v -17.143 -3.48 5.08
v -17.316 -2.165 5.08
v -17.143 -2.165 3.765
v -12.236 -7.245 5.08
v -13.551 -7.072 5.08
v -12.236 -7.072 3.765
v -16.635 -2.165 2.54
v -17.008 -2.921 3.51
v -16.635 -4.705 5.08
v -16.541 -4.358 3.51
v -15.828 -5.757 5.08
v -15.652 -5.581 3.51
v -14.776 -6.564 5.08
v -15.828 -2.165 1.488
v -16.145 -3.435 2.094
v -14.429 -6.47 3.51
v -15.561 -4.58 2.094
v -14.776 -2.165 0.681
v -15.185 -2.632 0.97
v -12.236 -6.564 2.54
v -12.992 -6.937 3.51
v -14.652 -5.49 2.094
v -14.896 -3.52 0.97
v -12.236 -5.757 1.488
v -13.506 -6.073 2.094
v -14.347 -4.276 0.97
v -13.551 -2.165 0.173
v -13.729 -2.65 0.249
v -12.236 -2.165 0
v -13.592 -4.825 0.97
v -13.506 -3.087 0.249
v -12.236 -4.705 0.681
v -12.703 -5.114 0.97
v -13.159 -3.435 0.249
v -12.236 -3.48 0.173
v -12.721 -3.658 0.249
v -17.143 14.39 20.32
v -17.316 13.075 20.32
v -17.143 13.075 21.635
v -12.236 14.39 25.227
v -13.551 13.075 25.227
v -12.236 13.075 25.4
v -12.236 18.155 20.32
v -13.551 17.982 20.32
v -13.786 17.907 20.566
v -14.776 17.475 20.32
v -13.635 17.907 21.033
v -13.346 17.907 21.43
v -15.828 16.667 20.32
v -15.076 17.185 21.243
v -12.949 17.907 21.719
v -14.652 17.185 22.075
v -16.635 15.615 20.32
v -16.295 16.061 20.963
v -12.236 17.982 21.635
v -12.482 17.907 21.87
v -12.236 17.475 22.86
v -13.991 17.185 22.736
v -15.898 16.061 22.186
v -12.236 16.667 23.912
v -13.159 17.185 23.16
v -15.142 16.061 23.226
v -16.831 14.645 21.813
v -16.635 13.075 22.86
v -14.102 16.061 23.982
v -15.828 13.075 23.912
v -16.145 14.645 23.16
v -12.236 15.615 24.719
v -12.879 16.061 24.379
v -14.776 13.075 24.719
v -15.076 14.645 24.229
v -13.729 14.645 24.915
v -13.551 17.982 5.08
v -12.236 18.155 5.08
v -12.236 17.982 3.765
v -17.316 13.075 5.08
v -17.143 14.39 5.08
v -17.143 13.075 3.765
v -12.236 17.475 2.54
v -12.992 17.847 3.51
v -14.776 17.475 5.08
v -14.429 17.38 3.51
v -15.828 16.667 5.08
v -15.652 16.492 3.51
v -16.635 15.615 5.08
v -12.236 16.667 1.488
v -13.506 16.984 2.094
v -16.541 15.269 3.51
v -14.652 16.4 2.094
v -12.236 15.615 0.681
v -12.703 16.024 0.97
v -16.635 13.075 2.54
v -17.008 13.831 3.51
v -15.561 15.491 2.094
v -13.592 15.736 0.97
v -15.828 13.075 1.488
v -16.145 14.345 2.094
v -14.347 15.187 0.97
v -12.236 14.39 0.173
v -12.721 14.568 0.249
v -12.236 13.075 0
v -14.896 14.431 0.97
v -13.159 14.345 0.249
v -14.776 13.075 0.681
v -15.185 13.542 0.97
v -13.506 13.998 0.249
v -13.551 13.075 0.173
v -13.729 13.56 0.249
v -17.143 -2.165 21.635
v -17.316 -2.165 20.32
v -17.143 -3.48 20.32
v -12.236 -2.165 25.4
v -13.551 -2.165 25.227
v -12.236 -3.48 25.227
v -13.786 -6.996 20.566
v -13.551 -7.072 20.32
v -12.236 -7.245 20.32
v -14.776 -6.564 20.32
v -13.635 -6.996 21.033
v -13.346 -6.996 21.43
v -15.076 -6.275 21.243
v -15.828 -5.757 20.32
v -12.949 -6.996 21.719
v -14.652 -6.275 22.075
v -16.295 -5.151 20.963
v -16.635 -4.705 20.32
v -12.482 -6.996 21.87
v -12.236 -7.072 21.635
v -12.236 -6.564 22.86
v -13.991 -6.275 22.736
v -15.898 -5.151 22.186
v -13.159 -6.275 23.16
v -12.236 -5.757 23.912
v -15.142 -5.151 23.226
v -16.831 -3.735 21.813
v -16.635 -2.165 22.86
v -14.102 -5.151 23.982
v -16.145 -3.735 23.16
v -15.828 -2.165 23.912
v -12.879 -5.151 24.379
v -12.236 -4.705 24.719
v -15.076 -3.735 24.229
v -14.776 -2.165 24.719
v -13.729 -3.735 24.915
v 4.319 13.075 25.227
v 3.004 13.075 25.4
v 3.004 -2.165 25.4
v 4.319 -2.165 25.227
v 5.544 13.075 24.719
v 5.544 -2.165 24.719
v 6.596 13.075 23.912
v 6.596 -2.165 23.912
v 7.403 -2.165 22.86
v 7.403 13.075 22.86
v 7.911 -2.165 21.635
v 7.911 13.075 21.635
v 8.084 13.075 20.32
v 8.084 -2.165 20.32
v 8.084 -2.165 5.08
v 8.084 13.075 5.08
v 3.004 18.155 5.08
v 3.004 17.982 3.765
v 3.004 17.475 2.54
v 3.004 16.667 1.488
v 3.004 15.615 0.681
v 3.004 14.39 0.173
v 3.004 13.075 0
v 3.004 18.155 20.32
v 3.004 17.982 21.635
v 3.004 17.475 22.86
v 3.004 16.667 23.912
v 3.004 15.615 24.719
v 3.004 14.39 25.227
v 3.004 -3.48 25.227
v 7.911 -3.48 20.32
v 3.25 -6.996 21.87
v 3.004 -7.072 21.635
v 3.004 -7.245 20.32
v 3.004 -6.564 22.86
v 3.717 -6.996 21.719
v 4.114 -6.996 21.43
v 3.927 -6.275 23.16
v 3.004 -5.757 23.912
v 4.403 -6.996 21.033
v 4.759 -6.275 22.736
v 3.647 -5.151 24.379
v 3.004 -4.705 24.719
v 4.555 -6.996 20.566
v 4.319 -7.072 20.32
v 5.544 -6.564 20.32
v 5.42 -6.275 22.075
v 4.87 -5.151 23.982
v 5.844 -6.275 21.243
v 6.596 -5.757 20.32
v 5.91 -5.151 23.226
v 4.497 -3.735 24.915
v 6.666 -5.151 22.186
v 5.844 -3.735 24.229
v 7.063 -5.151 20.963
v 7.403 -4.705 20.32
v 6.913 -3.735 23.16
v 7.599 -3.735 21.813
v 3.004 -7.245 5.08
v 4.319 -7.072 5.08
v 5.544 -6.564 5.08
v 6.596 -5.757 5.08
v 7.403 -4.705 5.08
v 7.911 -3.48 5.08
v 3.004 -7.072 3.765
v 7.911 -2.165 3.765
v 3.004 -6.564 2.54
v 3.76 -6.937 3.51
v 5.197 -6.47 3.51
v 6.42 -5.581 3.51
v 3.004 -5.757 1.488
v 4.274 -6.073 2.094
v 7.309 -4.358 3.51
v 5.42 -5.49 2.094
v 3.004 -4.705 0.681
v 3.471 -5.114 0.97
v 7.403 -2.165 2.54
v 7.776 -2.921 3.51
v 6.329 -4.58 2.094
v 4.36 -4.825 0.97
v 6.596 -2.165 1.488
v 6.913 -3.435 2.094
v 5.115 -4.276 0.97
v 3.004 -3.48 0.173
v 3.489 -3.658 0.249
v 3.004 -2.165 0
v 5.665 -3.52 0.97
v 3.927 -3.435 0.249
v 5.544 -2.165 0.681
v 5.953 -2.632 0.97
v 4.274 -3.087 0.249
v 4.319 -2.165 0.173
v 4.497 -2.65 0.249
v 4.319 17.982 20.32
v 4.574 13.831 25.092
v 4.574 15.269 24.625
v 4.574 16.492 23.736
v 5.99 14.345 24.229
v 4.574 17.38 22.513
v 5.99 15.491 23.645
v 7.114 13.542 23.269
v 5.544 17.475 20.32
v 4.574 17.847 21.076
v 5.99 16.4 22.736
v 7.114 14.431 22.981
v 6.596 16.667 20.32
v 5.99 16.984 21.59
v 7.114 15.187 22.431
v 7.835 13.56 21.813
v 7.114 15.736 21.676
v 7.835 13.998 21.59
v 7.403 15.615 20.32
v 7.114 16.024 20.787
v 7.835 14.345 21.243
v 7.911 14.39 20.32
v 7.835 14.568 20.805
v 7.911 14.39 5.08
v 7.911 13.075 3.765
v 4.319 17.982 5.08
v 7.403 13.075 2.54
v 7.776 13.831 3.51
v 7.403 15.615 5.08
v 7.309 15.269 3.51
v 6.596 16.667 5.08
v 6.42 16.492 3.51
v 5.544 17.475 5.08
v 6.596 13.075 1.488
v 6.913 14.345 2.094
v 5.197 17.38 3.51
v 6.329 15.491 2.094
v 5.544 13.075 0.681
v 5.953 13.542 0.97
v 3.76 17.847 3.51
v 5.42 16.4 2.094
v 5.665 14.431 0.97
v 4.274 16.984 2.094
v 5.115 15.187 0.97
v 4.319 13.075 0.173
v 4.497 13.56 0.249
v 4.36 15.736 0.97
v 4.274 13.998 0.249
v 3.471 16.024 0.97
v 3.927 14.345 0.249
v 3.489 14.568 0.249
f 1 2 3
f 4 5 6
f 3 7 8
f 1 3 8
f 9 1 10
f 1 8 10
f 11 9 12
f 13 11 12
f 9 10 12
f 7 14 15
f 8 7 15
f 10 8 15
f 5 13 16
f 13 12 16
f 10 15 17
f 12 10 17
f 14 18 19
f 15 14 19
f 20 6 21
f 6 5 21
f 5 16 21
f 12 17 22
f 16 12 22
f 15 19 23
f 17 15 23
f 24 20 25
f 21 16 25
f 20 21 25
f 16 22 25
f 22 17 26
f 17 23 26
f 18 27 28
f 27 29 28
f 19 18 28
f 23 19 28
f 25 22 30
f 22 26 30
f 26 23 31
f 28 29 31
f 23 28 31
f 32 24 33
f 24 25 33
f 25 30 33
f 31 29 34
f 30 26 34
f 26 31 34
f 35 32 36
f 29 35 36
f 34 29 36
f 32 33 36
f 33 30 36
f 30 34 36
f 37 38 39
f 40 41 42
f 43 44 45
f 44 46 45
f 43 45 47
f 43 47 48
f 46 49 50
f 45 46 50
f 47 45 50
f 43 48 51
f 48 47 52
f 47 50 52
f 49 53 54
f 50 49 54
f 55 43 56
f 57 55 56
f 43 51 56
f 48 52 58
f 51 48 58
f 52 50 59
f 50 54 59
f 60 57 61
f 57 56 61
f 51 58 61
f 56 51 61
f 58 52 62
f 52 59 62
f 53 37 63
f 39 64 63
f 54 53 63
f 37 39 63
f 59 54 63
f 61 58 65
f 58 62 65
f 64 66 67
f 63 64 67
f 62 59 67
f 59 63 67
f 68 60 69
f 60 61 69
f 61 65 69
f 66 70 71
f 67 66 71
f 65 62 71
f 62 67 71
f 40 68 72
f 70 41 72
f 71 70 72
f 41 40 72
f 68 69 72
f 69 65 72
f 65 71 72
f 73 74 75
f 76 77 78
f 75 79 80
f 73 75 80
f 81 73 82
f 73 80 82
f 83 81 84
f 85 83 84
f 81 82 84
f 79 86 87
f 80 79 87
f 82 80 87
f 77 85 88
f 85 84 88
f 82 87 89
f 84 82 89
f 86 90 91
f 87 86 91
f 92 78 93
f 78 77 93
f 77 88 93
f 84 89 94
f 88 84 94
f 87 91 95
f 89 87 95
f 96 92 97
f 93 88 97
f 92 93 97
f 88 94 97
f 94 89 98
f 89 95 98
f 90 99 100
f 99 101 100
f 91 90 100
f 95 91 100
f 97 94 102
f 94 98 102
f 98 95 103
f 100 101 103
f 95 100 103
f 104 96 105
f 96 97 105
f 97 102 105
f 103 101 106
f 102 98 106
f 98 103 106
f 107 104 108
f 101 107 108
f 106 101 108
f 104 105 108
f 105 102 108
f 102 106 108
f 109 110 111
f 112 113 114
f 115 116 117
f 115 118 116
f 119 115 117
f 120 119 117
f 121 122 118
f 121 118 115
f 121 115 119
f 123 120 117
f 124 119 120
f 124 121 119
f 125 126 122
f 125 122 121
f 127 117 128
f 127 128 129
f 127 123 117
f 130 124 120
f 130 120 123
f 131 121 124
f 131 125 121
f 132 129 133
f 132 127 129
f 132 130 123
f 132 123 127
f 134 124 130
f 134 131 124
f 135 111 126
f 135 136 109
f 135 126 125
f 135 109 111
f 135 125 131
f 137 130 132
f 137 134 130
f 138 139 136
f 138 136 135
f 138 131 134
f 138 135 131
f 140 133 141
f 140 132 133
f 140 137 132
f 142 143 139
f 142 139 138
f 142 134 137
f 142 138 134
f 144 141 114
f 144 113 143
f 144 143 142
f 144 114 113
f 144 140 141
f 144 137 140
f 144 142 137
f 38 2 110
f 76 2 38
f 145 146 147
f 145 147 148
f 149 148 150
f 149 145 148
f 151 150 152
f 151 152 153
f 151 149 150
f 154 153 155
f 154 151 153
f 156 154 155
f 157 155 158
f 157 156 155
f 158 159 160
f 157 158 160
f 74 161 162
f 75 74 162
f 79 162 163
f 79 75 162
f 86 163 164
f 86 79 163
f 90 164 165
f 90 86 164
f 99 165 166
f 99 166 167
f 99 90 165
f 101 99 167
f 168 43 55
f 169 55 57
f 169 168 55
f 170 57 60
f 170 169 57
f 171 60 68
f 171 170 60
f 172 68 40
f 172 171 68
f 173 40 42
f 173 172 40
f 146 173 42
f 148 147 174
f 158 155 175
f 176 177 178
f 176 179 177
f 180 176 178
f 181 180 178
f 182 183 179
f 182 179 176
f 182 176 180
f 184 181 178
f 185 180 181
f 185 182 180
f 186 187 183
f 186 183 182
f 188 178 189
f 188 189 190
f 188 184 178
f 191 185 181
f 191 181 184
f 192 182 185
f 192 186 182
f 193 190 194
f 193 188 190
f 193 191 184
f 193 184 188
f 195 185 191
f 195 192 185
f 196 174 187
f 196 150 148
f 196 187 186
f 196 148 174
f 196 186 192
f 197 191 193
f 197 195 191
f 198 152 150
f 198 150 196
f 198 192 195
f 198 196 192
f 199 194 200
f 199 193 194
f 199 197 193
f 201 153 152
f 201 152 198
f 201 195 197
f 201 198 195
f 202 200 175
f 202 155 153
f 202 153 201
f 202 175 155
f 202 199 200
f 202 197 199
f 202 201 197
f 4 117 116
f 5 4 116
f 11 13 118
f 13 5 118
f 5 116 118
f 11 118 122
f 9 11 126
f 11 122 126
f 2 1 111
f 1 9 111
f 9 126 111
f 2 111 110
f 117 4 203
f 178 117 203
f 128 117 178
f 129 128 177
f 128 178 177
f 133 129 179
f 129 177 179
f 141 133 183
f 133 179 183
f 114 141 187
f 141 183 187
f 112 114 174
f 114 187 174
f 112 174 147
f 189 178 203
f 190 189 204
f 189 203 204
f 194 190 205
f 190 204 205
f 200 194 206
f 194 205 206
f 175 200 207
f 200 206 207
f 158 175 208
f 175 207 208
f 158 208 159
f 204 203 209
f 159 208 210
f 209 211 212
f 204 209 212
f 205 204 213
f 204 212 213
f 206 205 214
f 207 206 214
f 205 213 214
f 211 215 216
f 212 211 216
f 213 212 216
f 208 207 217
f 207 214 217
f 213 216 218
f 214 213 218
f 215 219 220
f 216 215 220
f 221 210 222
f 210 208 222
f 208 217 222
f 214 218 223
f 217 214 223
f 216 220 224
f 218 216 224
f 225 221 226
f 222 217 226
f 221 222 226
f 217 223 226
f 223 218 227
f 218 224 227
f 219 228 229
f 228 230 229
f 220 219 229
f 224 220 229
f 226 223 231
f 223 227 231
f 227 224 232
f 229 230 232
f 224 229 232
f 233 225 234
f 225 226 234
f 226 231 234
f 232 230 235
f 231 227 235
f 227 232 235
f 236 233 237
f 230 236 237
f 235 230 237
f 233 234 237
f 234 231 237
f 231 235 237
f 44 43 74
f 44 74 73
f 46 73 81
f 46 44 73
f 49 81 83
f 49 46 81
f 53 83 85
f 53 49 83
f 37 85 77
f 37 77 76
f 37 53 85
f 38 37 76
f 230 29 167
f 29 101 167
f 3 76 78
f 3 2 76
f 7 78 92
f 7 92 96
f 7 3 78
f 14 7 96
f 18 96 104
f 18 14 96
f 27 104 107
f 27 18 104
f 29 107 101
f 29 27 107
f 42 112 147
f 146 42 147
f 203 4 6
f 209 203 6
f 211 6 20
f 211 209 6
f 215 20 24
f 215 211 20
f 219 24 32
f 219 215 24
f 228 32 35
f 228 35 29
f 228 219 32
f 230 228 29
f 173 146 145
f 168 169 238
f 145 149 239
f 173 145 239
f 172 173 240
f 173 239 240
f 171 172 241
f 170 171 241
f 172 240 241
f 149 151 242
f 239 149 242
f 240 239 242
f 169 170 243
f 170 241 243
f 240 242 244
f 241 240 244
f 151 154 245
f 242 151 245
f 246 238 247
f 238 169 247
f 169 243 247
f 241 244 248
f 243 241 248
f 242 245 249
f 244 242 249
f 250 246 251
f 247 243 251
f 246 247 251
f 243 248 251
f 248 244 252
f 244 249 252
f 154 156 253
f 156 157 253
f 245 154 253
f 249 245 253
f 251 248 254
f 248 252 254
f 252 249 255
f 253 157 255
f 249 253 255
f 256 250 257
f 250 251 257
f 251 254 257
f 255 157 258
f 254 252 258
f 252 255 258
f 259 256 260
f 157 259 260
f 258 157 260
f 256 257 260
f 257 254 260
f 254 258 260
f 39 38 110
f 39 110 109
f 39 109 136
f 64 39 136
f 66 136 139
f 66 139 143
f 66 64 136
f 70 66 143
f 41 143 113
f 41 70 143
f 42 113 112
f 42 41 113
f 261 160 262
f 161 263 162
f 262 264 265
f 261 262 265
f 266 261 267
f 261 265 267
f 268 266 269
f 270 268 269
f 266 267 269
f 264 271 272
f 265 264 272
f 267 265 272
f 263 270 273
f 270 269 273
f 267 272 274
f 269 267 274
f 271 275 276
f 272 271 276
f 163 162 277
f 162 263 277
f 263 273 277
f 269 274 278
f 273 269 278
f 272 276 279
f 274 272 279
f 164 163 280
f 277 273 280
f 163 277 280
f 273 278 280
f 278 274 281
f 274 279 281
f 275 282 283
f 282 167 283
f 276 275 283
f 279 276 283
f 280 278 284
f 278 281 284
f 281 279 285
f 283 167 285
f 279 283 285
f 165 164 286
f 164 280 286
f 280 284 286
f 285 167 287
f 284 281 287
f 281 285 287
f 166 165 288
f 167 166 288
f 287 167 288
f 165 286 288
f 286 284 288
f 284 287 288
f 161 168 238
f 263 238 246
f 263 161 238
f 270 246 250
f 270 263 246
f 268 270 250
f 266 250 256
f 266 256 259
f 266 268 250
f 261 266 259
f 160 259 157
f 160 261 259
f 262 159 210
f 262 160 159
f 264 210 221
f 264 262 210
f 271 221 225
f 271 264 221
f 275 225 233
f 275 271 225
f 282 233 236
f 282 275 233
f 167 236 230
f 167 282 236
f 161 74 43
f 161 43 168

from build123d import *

# Parameters (mm, degrees)
F0_W     = 25.4
F0_H     = 25.400001
F1_DEPTH = 25.4
F2_R     = 5.08
F3_R     = 5.08
F4_R     = 5.08
F5_R     = 5.08
F6_R     = 5.08


with BuildPart() as f1:
    # F0 (on Top) → F1 (new body)
    with BuildSketch(Plane.XY):
        with Locations((-4.615962, 5.455227)):
            Rectangle(F0_W, F0_H)
    extrude(amount=F1_DEPTH)

    # F2
    f2_edges = [f1.edges().sort_by_distance(p)[0] for p in [
        (-17.315962, 5.455228, 25.4),
    ]]
    fillet(f2_edges, radius=F2_R)

    # F3
    f3_edges = [f1.edges().sort_by_distance(p)[0] for p in [
        (-2.075962, 18.155228, 25.4),
    ]]
    fillet(f3_edges, radius=F3_R)

    # F4
    f4_edges = [f1.edges().sort_by_distance(p)[0] for p in [
        (8.084038, 2.915228, 25.4),
    ]]
    fillet(f4_edges, radius=F4_R)

    # F5
    f5_edges = [f1.edges().sort_by_distance(p)[0] for p in [
        (-4.615962, -7.244773, 25.4),
    ]]
    fillet(f5_edges, radius=F5_R)

    # F6
    f6_edges = [f1.edges().sort_by_distance(p)[0] for p in [
        (-4.615962, -7.244773, 0),
    ]]
    fillet(f6_edges, radius=F6_R)


solid = f1.part
